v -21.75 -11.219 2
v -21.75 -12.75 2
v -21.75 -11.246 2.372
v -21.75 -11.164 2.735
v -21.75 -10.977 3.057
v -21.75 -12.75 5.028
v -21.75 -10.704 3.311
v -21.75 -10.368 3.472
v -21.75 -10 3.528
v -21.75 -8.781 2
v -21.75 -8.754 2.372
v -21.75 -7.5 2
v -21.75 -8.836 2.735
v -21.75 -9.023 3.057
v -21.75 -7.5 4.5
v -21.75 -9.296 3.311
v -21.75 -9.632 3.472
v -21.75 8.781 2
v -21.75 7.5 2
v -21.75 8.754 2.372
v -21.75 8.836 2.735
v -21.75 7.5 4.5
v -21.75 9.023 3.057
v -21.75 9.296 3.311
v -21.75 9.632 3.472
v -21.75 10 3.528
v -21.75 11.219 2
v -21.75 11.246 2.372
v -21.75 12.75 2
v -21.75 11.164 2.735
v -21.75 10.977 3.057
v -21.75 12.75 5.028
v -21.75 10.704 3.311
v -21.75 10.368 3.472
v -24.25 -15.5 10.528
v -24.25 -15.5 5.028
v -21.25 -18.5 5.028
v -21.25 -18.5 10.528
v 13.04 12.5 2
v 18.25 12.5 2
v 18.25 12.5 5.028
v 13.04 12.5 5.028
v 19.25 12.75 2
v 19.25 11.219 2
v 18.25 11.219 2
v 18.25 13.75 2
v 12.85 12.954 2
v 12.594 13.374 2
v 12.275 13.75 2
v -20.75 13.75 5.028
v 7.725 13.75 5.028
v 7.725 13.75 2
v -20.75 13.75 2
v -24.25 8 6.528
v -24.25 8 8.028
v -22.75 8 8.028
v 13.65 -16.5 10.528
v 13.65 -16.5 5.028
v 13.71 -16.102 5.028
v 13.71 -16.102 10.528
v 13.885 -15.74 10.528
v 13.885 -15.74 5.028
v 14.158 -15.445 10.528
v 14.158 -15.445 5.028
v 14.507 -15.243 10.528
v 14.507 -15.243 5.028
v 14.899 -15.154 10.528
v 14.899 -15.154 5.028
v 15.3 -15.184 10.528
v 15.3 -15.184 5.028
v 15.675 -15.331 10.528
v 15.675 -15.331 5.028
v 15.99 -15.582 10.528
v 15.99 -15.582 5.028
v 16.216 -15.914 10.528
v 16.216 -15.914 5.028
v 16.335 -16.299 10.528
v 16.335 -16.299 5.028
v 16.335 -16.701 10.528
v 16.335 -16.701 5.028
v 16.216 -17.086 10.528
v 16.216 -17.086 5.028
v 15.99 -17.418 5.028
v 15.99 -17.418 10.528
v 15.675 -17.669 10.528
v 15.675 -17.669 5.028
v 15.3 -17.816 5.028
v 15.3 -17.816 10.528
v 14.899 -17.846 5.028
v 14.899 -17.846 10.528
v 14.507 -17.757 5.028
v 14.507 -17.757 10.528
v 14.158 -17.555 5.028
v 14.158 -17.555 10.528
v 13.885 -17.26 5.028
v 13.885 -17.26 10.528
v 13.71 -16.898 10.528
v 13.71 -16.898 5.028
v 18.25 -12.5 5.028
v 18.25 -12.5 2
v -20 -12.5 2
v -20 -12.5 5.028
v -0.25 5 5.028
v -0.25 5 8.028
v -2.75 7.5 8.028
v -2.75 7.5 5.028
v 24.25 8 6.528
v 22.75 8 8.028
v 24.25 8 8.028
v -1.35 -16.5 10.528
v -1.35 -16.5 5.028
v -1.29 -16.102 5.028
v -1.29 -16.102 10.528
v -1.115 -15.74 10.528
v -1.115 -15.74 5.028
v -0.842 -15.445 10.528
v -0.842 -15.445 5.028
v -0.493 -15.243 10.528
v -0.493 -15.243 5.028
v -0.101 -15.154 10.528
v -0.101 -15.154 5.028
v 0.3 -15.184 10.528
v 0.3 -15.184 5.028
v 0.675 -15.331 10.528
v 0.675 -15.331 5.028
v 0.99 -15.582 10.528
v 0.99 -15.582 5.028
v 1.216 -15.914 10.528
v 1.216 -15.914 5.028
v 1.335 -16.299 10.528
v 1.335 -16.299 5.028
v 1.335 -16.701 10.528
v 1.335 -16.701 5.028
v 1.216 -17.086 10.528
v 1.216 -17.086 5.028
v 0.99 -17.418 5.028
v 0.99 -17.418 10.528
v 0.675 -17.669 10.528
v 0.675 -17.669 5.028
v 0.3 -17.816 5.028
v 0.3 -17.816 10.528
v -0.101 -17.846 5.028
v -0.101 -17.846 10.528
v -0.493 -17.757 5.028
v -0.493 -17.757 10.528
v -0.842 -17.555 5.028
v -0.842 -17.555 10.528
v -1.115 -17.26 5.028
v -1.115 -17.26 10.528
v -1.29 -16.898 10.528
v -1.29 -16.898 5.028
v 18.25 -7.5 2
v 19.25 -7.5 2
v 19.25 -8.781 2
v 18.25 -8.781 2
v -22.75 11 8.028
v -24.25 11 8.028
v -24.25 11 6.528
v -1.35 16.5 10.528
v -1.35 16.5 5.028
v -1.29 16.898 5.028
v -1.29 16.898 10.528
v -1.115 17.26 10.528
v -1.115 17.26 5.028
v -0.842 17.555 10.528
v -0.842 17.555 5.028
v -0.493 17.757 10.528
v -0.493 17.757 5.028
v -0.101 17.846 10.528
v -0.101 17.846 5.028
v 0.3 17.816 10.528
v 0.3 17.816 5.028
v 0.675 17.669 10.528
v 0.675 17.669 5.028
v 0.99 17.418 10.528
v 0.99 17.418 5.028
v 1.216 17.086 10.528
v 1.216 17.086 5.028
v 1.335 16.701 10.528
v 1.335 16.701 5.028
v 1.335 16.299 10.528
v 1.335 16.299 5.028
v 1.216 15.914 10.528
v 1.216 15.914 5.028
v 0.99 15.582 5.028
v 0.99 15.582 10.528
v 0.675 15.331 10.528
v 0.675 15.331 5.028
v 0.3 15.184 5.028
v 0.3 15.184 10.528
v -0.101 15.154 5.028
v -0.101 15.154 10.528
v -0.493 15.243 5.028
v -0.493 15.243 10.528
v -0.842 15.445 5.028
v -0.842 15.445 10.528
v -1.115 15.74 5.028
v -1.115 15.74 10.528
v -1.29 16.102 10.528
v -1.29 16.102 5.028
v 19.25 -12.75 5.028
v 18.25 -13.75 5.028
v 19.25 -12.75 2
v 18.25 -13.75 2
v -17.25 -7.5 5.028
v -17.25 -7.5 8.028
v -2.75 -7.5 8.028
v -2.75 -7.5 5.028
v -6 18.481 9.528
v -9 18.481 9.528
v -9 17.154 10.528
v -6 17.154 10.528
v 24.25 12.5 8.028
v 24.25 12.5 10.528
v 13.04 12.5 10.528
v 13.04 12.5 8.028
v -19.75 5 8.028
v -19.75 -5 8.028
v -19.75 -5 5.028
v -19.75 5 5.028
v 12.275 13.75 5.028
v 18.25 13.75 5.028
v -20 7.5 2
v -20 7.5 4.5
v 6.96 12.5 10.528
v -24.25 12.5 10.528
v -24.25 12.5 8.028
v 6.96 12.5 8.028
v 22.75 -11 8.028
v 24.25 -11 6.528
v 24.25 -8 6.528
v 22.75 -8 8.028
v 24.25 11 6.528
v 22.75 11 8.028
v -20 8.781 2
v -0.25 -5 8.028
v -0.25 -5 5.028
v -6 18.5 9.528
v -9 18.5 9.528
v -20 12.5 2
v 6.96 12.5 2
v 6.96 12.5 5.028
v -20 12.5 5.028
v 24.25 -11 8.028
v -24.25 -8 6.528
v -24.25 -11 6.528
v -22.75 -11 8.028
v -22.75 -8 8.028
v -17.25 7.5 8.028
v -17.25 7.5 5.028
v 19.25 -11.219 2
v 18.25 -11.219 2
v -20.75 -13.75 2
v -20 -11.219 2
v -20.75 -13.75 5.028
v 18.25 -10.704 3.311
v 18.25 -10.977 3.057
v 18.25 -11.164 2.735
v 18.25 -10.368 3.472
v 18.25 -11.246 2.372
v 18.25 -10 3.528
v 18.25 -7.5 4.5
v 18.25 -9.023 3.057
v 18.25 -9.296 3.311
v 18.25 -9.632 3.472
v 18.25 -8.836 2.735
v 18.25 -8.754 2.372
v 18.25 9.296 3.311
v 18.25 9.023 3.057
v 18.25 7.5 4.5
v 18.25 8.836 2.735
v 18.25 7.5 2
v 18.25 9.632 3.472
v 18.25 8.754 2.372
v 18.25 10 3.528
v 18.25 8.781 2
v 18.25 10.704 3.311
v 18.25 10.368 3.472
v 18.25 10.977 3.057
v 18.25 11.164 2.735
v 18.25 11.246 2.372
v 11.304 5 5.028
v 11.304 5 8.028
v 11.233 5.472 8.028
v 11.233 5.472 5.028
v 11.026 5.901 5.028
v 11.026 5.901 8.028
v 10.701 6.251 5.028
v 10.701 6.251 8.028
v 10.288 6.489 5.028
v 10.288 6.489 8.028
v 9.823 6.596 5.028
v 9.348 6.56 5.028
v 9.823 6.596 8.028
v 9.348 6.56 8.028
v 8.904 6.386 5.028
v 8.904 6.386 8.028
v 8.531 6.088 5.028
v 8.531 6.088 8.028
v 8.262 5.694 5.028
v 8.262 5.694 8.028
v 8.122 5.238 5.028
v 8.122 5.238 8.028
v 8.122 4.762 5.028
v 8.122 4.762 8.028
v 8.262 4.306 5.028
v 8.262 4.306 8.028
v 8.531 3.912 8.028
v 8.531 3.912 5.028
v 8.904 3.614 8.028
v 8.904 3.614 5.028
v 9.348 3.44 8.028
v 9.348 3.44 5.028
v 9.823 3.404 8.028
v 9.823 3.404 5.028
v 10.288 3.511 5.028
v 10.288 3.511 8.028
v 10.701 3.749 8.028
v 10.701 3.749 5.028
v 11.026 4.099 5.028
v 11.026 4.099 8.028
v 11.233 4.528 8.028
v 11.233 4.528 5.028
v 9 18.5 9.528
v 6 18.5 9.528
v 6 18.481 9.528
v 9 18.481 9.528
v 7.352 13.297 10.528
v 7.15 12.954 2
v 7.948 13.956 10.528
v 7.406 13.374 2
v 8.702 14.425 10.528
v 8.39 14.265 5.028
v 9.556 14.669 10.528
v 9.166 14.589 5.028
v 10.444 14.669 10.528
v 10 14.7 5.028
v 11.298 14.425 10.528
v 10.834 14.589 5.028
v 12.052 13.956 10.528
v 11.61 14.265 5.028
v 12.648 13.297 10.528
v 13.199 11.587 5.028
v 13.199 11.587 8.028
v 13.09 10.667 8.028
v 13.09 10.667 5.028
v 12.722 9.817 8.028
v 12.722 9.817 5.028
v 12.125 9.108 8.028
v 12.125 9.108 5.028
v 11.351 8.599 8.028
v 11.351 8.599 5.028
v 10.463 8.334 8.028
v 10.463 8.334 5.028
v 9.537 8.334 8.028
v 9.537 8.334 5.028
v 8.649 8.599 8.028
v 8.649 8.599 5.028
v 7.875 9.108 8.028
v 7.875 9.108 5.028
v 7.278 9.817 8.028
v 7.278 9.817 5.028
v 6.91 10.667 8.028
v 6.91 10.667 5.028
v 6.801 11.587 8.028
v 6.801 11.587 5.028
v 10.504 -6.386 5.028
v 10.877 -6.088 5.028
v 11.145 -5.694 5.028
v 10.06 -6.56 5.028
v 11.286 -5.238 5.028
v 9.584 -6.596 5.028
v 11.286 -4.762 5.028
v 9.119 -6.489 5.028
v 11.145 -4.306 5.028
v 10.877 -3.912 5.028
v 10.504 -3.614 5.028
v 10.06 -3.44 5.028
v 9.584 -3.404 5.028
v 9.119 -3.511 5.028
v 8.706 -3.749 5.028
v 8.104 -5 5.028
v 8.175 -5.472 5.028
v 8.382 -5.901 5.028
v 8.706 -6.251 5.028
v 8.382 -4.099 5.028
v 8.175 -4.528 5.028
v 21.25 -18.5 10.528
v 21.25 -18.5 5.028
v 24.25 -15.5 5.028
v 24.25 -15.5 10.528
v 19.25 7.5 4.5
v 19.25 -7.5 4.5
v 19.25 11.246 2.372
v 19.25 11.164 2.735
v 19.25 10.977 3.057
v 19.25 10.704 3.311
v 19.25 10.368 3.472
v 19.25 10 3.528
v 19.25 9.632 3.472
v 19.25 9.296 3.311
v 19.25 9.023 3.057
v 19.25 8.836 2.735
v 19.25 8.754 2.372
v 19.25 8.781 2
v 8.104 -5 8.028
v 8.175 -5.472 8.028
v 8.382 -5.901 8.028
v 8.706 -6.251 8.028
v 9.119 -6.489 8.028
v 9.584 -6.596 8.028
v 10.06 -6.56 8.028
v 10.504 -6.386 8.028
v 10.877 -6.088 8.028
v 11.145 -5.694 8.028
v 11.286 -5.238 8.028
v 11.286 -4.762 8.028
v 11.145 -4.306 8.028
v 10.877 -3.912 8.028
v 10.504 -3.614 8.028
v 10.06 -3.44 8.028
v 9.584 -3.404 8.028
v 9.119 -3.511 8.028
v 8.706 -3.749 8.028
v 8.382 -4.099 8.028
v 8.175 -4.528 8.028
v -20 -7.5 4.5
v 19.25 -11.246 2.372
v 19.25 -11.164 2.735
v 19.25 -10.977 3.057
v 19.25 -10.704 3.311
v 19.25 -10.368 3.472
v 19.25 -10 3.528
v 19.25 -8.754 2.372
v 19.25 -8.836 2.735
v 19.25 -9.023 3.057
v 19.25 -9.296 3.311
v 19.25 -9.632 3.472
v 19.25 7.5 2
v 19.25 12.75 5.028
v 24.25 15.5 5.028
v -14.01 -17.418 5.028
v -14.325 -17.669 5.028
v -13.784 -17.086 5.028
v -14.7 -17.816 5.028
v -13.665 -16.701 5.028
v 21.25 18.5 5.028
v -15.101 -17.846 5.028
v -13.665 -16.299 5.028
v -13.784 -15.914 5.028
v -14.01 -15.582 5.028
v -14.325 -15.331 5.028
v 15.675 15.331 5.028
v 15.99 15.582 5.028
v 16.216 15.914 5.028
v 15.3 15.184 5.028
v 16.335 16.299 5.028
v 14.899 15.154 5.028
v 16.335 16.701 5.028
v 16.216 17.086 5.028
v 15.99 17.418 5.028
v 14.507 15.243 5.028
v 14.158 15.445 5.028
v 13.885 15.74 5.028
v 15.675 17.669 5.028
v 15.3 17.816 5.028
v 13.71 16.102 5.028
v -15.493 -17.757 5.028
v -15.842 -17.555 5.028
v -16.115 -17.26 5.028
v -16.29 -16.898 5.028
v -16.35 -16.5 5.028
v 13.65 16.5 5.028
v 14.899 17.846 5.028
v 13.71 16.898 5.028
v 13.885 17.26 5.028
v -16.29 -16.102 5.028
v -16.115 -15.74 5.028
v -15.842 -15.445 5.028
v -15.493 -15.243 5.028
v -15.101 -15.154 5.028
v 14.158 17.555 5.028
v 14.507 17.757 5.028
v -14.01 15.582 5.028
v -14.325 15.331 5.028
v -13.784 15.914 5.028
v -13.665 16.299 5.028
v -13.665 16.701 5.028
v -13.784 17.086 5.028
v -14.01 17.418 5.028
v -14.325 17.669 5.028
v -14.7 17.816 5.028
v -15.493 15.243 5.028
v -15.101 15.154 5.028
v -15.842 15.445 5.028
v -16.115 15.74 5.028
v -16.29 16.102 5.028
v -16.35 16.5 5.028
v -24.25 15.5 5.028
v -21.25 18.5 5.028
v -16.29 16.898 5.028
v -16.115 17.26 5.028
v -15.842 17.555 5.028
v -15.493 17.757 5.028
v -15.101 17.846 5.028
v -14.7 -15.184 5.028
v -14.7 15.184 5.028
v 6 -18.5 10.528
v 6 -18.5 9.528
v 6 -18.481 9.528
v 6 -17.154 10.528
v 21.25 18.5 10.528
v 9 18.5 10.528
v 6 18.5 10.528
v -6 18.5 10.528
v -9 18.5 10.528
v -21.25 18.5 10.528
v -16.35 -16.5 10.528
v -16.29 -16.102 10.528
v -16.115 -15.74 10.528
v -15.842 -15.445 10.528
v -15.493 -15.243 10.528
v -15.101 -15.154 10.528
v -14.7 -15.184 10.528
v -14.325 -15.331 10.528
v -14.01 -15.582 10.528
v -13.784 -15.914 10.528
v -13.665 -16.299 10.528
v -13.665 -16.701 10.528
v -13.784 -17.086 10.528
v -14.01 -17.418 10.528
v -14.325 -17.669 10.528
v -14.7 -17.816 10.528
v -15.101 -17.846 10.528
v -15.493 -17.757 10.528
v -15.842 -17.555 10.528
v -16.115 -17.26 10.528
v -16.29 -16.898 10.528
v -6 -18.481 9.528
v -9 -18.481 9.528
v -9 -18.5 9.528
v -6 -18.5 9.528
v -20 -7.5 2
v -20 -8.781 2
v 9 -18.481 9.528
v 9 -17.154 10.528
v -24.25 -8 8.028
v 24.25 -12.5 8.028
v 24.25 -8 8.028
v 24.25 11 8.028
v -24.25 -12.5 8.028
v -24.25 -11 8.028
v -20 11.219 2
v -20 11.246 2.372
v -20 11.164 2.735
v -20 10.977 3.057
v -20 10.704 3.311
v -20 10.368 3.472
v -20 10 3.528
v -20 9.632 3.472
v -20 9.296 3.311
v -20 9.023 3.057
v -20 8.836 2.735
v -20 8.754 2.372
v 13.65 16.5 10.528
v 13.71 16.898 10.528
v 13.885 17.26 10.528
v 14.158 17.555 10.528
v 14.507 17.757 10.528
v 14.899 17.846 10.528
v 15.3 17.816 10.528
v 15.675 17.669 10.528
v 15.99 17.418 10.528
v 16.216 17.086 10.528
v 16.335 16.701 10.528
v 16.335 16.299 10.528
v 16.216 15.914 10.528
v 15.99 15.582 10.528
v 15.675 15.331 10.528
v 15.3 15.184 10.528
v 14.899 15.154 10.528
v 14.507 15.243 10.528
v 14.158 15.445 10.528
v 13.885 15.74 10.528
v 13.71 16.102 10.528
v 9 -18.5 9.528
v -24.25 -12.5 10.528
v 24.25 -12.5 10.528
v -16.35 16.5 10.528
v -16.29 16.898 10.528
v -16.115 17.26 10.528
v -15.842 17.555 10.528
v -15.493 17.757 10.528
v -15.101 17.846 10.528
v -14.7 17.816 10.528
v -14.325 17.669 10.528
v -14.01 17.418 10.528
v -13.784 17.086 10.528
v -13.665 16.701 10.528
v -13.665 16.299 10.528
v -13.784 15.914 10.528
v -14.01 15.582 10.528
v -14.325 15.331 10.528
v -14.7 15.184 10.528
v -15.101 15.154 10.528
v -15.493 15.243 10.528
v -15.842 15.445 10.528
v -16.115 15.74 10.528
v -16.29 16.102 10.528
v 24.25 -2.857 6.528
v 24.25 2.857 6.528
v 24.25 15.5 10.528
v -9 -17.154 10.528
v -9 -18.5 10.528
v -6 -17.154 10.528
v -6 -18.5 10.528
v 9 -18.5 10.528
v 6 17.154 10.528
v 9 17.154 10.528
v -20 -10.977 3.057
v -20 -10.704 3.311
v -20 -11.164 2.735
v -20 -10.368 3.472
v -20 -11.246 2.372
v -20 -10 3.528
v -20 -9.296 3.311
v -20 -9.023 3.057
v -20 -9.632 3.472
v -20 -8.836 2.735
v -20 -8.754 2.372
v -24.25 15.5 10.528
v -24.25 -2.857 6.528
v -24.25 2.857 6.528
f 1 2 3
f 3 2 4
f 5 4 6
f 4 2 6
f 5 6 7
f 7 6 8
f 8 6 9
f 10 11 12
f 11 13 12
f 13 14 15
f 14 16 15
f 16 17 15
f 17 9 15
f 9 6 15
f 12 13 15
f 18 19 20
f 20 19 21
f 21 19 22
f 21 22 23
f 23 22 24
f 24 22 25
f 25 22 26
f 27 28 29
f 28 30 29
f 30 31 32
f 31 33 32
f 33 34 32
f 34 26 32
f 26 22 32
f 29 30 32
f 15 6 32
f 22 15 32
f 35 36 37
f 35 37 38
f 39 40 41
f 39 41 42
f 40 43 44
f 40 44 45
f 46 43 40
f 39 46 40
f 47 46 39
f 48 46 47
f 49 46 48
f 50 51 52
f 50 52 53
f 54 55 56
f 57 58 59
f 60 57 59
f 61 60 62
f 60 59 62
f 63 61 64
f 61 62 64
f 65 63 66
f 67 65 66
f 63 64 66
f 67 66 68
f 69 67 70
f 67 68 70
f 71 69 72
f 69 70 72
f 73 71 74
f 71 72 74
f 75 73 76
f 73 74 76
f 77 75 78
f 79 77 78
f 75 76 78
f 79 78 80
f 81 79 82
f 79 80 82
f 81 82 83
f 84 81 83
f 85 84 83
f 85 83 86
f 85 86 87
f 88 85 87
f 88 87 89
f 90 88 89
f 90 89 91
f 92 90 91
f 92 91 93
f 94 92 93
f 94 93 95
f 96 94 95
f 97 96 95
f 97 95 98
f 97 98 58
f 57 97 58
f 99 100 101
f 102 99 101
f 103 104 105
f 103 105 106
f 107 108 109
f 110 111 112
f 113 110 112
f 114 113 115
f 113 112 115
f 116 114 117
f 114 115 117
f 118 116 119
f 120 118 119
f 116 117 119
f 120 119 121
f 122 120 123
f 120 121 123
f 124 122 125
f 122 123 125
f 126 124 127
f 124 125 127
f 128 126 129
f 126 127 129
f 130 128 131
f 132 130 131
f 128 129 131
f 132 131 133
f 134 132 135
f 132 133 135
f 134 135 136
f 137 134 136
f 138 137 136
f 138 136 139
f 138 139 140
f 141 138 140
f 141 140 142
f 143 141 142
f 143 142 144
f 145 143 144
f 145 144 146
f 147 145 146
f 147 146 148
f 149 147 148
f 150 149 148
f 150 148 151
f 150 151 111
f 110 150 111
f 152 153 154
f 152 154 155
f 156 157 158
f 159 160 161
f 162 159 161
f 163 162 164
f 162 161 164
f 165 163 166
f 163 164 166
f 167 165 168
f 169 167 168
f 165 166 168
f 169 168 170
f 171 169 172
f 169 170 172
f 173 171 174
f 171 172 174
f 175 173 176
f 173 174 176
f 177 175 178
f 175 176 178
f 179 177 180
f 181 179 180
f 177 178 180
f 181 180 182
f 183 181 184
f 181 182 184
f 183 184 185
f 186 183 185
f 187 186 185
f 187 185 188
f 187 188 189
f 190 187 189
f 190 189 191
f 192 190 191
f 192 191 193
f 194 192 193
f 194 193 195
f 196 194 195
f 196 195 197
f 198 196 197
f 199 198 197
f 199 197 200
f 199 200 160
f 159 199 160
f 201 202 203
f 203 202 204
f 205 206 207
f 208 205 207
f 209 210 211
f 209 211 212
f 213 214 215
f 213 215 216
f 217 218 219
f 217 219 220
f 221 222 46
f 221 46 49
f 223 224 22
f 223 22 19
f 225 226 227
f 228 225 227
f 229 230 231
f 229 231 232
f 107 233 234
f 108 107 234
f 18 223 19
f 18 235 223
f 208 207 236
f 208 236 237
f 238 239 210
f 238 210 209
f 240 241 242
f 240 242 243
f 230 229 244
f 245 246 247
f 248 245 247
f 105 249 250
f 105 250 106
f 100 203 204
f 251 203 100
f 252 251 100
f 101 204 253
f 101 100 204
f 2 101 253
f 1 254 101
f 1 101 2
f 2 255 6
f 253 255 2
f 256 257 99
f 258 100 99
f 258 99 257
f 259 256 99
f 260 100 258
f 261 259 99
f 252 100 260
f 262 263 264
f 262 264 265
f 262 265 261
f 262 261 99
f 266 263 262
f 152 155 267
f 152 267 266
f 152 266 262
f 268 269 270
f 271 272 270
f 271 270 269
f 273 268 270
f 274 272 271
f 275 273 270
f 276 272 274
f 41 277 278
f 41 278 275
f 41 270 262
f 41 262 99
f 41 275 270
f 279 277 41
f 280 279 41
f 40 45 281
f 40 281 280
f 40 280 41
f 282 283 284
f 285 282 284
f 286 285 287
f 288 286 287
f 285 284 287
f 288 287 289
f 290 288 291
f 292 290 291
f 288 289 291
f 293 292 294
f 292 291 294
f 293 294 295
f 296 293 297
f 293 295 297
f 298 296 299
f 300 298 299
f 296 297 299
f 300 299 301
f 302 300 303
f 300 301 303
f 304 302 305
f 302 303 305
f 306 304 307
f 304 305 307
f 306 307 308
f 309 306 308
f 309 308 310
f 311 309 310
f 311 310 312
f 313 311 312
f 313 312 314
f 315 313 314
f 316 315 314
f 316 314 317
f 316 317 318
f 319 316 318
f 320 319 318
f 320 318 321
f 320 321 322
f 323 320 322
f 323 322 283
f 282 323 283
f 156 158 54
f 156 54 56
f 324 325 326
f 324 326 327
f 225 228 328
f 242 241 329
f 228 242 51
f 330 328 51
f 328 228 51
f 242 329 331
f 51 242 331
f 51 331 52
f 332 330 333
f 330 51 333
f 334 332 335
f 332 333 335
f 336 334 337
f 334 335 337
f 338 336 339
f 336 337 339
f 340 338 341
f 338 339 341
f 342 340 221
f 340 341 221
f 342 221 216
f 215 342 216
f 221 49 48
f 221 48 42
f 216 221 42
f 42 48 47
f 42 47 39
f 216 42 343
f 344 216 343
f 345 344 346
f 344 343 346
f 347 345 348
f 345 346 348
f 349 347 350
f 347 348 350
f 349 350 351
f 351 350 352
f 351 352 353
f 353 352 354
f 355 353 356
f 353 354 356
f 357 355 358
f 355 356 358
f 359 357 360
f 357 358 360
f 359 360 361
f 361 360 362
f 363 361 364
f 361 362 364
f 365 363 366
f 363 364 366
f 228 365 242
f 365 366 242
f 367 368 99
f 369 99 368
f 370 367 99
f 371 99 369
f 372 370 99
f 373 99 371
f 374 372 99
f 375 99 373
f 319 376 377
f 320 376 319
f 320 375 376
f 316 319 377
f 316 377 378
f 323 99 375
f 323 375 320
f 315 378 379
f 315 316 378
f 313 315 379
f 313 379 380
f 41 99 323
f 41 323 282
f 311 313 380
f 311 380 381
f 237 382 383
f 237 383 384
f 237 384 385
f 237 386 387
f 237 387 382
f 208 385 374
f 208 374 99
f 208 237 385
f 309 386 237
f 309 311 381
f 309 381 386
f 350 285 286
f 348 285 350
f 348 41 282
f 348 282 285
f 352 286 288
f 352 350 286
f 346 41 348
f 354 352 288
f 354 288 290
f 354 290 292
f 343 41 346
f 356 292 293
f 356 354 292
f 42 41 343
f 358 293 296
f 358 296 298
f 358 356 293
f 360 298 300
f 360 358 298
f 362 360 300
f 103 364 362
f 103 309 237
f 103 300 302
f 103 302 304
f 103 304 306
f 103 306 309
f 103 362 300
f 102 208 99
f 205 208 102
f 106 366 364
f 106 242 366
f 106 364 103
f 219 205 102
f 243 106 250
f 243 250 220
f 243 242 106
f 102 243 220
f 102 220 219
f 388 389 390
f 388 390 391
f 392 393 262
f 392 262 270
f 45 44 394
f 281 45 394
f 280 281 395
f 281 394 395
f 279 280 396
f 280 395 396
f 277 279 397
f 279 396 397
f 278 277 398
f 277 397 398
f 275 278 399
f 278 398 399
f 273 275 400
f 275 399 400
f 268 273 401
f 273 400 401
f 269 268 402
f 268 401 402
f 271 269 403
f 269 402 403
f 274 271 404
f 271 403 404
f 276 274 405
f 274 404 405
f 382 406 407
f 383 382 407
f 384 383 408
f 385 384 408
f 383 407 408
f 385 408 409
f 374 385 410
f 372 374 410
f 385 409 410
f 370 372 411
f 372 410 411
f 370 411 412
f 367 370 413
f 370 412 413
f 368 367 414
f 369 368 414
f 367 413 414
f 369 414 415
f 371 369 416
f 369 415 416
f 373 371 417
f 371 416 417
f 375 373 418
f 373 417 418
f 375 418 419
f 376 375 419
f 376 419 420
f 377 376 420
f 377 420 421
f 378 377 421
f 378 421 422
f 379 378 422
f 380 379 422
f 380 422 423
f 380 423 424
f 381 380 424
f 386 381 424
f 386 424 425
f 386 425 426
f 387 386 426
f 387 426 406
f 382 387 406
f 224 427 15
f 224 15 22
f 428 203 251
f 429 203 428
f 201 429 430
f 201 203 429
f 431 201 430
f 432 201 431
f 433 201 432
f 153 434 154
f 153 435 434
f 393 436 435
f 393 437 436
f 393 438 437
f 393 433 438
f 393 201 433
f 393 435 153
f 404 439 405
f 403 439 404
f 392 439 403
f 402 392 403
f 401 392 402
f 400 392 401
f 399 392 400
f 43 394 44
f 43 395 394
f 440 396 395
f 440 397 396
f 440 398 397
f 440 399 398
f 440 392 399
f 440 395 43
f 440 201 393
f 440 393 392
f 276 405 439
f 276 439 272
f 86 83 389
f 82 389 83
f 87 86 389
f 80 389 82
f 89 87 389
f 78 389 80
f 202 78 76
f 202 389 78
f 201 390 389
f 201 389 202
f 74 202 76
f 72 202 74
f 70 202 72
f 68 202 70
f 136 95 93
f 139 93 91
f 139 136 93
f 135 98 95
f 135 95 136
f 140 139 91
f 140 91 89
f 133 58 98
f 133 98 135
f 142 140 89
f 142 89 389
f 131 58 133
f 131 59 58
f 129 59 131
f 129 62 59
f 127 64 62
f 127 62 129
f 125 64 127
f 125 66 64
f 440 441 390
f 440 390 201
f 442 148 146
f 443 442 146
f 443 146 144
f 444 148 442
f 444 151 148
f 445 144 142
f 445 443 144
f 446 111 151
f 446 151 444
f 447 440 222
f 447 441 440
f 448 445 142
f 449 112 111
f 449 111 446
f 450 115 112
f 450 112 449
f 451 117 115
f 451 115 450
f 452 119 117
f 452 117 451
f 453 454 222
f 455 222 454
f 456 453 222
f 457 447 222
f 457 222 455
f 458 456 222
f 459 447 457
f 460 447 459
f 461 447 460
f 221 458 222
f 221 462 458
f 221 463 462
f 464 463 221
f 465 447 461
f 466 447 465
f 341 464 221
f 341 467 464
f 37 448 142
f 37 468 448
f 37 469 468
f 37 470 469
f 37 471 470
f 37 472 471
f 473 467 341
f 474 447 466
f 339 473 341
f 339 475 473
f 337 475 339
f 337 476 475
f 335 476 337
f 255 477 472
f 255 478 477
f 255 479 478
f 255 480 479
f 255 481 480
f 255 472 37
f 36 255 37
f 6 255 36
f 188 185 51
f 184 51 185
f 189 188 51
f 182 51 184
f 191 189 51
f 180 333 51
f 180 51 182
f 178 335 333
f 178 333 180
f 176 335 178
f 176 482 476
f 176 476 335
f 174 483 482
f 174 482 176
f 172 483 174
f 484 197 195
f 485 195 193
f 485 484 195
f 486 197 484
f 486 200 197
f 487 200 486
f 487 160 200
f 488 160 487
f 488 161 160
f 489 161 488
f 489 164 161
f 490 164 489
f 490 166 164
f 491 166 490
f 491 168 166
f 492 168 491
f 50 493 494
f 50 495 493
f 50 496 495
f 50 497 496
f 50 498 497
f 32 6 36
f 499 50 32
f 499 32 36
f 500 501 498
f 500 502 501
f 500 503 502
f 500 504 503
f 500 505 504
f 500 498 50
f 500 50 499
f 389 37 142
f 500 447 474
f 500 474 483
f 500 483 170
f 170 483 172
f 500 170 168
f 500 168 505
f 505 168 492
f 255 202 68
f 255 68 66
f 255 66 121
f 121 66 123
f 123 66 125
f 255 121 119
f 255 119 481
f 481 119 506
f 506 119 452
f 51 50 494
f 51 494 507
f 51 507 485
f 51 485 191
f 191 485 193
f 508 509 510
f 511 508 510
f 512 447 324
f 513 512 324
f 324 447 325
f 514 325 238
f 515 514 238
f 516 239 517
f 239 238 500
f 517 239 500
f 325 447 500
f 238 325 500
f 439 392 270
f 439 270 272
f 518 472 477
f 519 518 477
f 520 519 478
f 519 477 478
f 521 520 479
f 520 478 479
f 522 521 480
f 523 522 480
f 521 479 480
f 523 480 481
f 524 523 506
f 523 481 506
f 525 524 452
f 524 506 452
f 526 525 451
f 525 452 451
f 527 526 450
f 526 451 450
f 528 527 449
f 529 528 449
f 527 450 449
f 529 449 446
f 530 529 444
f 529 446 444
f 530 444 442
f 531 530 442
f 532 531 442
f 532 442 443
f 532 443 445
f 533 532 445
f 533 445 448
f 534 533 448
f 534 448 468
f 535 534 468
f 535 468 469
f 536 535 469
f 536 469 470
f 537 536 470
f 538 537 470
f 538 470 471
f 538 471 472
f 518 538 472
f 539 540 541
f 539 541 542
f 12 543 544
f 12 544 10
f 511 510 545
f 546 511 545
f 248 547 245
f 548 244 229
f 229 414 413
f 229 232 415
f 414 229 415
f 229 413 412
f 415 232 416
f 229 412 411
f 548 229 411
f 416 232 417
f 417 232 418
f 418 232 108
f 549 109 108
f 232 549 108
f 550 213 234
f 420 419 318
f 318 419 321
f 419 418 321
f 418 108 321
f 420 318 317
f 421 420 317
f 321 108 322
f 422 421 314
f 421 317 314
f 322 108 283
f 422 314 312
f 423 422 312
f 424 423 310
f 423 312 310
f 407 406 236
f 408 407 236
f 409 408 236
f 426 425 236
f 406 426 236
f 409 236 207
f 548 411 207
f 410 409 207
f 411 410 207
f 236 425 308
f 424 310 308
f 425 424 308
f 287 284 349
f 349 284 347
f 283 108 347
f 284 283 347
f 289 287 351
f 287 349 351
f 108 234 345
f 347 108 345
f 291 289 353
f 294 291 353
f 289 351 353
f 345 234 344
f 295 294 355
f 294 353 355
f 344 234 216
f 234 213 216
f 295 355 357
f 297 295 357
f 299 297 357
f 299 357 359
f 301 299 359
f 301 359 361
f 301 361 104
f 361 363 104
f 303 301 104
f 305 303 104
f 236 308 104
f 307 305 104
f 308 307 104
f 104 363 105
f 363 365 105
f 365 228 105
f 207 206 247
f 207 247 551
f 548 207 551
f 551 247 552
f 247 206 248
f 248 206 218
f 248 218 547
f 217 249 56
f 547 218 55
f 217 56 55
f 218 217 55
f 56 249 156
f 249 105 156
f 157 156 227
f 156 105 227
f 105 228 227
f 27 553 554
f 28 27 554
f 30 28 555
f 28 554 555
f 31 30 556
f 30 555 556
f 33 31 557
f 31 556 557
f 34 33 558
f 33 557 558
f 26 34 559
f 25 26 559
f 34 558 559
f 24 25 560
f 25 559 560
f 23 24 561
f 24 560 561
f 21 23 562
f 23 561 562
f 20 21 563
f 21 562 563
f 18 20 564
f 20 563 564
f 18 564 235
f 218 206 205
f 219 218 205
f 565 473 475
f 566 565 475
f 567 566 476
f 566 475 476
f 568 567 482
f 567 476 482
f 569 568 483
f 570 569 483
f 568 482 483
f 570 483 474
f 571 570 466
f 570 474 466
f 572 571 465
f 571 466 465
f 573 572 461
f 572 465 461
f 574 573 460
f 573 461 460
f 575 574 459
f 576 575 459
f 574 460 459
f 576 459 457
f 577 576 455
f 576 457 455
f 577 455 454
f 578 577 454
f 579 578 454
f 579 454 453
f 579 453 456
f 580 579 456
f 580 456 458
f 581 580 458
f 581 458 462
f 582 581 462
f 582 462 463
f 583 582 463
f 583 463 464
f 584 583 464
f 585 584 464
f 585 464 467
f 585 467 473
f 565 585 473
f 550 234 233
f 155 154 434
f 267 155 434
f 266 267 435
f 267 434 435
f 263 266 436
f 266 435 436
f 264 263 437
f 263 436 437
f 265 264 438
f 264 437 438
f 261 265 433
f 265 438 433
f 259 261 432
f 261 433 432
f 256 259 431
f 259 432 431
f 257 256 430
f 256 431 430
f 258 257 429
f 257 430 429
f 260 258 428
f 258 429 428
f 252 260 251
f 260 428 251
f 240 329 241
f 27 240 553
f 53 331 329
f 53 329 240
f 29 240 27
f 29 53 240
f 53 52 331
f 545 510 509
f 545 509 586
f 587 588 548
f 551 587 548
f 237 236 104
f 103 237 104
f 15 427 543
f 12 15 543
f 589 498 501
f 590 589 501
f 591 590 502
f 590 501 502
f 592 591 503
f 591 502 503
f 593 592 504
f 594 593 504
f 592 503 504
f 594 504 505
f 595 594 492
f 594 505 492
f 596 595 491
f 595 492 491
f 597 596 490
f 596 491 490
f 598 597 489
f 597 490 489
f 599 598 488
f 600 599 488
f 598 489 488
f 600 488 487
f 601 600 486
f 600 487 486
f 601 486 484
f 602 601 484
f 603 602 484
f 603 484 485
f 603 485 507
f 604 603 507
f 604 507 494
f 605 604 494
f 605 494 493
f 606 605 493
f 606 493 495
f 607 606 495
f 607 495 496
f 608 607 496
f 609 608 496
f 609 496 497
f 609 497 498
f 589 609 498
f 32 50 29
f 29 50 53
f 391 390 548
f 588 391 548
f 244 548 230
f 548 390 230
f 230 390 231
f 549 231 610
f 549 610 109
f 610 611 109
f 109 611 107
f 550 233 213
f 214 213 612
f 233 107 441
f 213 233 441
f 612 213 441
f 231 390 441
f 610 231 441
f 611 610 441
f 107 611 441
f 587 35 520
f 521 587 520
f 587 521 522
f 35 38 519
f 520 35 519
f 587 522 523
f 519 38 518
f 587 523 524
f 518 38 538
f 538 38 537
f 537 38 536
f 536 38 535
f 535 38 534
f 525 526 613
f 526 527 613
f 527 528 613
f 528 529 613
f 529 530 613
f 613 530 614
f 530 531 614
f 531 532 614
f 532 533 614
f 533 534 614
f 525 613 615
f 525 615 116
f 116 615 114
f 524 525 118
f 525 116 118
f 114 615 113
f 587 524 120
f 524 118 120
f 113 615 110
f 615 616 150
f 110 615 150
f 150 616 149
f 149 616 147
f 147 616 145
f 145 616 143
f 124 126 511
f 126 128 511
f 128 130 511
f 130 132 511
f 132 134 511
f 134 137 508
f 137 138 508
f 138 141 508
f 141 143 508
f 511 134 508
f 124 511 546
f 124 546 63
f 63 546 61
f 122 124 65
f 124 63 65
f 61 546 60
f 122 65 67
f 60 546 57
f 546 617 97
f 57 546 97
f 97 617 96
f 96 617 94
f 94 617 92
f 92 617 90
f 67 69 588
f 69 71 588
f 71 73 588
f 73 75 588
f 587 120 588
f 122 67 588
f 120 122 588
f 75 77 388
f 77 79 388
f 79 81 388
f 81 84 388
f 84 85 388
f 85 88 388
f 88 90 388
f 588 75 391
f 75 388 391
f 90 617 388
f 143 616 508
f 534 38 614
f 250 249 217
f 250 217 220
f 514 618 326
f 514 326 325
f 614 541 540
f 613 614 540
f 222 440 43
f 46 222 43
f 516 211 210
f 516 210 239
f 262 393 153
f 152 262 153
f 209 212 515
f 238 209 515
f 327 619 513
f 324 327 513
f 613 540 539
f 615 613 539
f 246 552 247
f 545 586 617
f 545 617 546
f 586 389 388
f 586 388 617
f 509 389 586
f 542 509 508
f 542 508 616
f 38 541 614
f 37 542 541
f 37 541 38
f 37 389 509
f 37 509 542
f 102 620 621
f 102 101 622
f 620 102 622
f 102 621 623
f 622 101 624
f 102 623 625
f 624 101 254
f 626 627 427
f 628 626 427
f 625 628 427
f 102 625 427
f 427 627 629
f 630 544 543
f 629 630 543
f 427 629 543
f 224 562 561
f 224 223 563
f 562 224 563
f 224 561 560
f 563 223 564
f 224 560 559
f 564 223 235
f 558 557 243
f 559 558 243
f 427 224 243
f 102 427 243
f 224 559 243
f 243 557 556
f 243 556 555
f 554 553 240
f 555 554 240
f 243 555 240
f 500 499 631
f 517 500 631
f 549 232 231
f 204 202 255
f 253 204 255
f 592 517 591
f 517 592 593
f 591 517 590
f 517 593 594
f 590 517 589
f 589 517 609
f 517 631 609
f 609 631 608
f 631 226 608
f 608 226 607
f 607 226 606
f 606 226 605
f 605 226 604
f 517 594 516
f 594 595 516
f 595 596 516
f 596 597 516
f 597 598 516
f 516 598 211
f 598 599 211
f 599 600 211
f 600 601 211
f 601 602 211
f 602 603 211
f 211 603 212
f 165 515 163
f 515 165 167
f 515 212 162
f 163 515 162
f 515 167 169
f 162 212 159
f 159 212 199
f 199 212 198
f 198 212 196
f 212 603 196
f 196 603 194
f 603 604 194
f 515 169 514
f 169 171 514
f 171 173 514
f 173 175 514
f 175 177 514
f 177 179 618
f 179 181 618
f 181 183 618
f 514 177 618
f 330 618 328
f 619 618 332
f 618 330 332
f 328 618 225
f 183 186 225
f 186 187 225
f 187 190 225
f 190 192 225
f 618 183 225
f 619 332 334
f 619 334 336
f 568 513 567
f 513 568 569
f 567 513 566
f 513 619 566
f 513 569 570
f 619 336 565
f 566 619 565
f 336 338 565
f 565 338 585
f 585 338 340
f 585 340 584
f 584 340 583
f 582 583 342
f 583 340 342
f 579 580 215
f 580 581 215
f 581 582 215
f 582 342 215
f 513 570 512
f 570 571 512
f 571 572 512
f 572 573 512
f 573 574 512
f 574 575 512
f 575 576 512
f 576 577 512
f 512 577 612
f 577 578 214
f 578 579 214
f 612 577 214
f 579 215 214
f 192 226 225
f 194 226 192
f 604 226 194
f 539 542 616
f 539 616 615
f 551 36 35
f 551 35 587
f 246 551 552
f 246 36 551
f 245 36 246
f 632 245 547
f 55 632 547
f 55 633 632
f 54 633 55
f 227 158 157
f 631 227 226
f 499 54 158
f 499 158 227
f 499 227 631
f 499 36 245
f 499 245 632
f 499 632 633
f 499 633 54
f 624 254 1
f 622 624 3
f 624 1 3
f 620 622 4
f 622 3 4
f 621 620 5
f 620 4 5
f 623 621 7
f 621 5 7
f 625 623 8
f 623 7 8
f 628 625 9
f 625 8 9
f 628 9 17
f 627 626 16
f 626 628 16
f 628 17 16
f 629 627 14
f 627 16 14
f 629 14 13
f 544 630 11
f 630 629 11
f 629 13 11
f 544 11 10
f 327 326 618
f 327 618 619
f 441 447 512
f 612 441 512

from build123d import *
from OCP.BRepFilletAPI import BRepFilletAPI_MakeChamfer

# Parameters (mm, degrees)
SKETCH_1_W                  = 48.5
SKETCH_1_H                  = 37
EXTRUDE_1_DEPTH             = 7.5
SKETCH_2_W                  = 4.5
SKETCH_2_H                  = 25
CUT_EXTRUDE_1_DEPTH         = 54.398977368
SKETCH_3_W                  = 41
SKETCH_3_H                  = 27.5
EXTRUDE_2_DEPTH             = 3.028
SKETCH_4_W                  = 38.25
SKETCH_4_H                  = 25
CUT_EXTRUDE_2_DEPTH         = 3.028
CUT_EXTRUDE_3_DEPTH         = 49.015109955
CUT_EXTRUDE_4_DEPTH         = 52.139033859
CUT_EXTRUDE_5_DEPTH         = 32.090983966
HOLE_WIZARD_2_5_2_5_1_D     = 2.5
HOLE_WIZARD_2_5_2_5_1_DEPTH = 1.75
HOLE_WIZARD_2_5_2_5_2_D     = 2.5
HOLE_WIZARD_2_5_2_5_2_DEPTH = 6
HOLE_WIZARD_2_5_2_5_3_D     = 2.5
HOLE_WIZARD_2_5_2_5_3_DEPTH = 4.25
HOLE_WIZARD_2_7_2_7_1_D     = 2.7
CHAMFER_1_SIZE              = 3
SKETCH_17_W                 = 3
SKETCH_17_H                 = 4
CUT_EXTRUDE_8_DEPTH         = 3
CHAMFER_2_SIZE              = 3
CHAMFER_2_SIZE_2            = 3.981134465
SKETCH_19_W                 = 2
SKETCH_19_H                 = 3
CUT_EXTRUDE_9_DEPTH         = 1.5
CHAMFER_3_SIZE              = 2
CHAMFER_4_SIZE              = 1
SKETCH_20_R                 = 3.2
CUT_EXTRUDE_10_DEPTH        = 21.5
SKETCH_21_W                 = 19.5
SKETCH_21_H                 = 15
CUT_EXTRUDE_11_DEPTH        = 21.5
CHAMFER_5_SIZE              = 2.5
SKETCH_22_W                 = 9
SKETCH_22_H                 = 15
CUT_EXTRUDE_12_DEPTH        = 51.5
SKETCH_23_W                 = 48.5
SKETCH_23_H                 = 2
CUT_EXTRUDE_13_DEPTH        = 50
SKETCH_24_R                 = 1.6
CUT_EXTRUDE_14_DEPTH        = 10


# Some blends are built 0.0001 mm under size
with BuildPart() as part:
    # 草图1 → 凸台-拉伸1 (new body)
    with BuildSketch(Plane(origin=(0, 0, 5.028), x_dir=(-1, 0, 0), z_dir=(0, 0, -1))):
        Rectangle(SKETCH_1_W, SKETCH_1_H)
    extrude(amount=-EXTRUDE_1_DEPTH)

    # 草图2 → 切除-拉伸1 (cut, through all)
    with BuildSketch(Plane(origin=(24.25, 0, 0), x_dir=(0, 0, -1), z_dir=(1, 0, 0))):
        with Locations((-10.278, 0)):
            Rectangle(SKETCH_2_W, SKETCH_2_H)
    extrude(amount=-CUT_EXTRUDE_1_DEPTH, mode=Mode.SUBTRACT)

    # 草图3 → 凸台-拉伸2 (add)
    with BuildSketch(Plane(origin=(0, 0, 5.028), x_dir=(-1, 0, 0), z_dir=(0, 0, -1))):
        with Locations((1.25, 0)):
            Rectangle(SKETCH_3_W, SKETCH_3_H)
    extrude(amount=EXTRUDE_2_DEPTH)

    # 草图4 → 切除-拉伸2 (cut)
    with BuildSketch(Plane(origin=(0, 0, 2), x_dir=(-1, 0, 0), z_dir=(0, 0, -1))):
        with Locations((0.875, 0)):
            Rectangle(SKETCH_4_W, SKETCH_4_H)
    extrude(amount=-CUT_EXTRUDE_2_DEPTH, mode=Mode.SUBTRACT)

    # 草图5 → 切除-拉伸3 (cut, through all)
    with BuildSketch(Plane.ZY.offset(-18.25)):
        with BuildLine():
            Line((2, 7.034395212), (2, -7.034395212))
            ThreePointArc((2, -7.034395212), (4.278, 0), (2, 7.034395212))
        make_face()
    extrude(amount=-CUT_EXTRUDE_3_DEPTH, mode=Mode.SUBTRACT)

    # 草图6 → 切除-拉伸4 (cut, through all)
    with BuildSketch(Plane.ZY.offset(21.75)):
        with BuildLine():
            Line((2, 7.034395212), (2, -7.034395212))
            ThreePointArc((2, -7.034395212), (4.278, 0), (2, 7.034395212))
        make_face()
    extrude(amount=-CUT_EXTRUDE_4_DEPTH, mode=Mode.SUBTRACT)

    # 草图7 → 切除-拉伸5 (cut, through all)
    with BuildSketch(Plane.XY.offset(8.028)):
        with BuildLine():
            Line((-7.978419869, 7.029222073), (-13.021580131, 7.029222073))
            ThreePointArc((-13.021580131, 7.029222073), (-17.801221513, 4.934335949), (-19.5, 0))
            ThreePointArc((-19.5, 0), (-17.801221513, -4.934335949), (-13.021580131, -7.029222073))
            Line((-13.021580131, -7.029222073), (-7.978419869, -7.029222073))
            ThreePointArc((-7.978419869, -7.029222073), (-3.198778487, -4.934335949), (-1.5, 0))
            ThreePointArc((-1.5, 0), (-3.198778487, 4.934335949), (-7.978419869, 7.029222073))
        make_face()
    extrude(amount=-CUT_EXTRUDE_5_DEPTH, mode=Mode.SUBTRACT)

    # Ø2.5 (2.5) 直径孔1
    with Locations(Plane.ZY.offset(21.75)):
        with Locations((2.278, 10)):
            Hole(HOLE_WIZARD_2_5_2_5_1_D / 2, depth=HOLE_WIZARD_2_5_2_5_1_DEPTH)

    # Ø2.5 (2.5) 直径孔2
    with Locations(Plane.ZY.offset(-18.25)):
        with Locations((2.278, -10), (2.278, 10)):
            Hole(HOLE_WIZARD_2_5_2_5_2_D / 2, depth=HOLE_WIZARD_2_5_2_5_2_DEPTH)

    # Ø2.5 (2.5) 直径孔3
    with Locations(Plane(origin=(-20, 0, 0), x_dir=(0, 0, -1), z_dir=(1, 0, 0))):
        with Locations((-2.278, -10)):
            Hole(HOLE_WIZARD_2_5_2_5_3_D / 2, depth=HOLE_WIZARD_2_5_2_5_3_DEPTH)

    # Ø2.7 (2.7) 直径孔1 (through all)
    with Locations(Plane.XY.offset(12.528)):
        with Locations((0, -16.5), (-15, -16.5), (15, -16.5), (0, 16.5), (-15, 16.5), (15, 16.5)):
            Hole(HOLE_WIZARD_2_7_2_7_1_D / 2)

    # 倒角1
    chamfer_1_edges = [part.edges().sort_by_distance(p)[0] for p in [
        (-24.25, 18.5, 8.778),
        (-24.25, -18.5, 8.778),
        (24.25, -18.5, 8.778),
        (24.25, 18.5, 8.778),
    ]]
    chamfer(chamfer_1_edges, length=CHAMFER_1_SIZE)

    # 草图17 → 切除-拉伸8 (cut)
    with BuildSketch(Plane.XY.offset(12.528)):
        with Locations((-7.5, -16.5)):
            Rectangle(SKETCH_17_W, SKETCH_17_H)
        with Locations((7.5, -16.5)):
            Rectangle(SKETCH_17_W, SKETCH_17_H)
        with Locations((7.5, 16.5)):
            Rectangle(SKETCH_17_W, SKETCH_17_H)
        with Locations((-7.5, 16.5)):
            Rectangle(SKETCH_17_W, SKETCH_17_H)
    extrude(amount=-CUT_EXTRUDE_8_DEPTH, mode=Mode.SUBTRACT)

    # 倒角2
    chamfer_2_edges_1 = [part.edges().sort_by_distance(p)[0] for p in [
        (7.5, -14.5, 9.528),
    ]]
    chamfer_2_side_1 = [part.faces().sort_by_distance(p)[0] for p in [
        (7.5, -14.5, 9.588),
    ]]
    chamfer_2_edges_2 = [part.edges().sort_by_distance(p)[0] for p in [
        (-7.5, -14.5, 9.528),
    ]]
    chamfer_2_side_2 = [part.faces().sort_by_distance(p)[0] for p in [
        (-7.5, -14.5, 9.588),
    ]]
    chamfer_2_edges_3 = [part.edges().sort_by_distance(p)[0] for p in [
        (-7.5, 14.5, 9.528),
    ]]
    chamfer_2_side_3 = [part.faces().sort_by_distance(p)[0] for p in [
        (-7.5, 14.5, 9.588),
    ]]
    chamfer_2_edges_4 = [part.edges().sort_by_distance(p)[0] for p in [
        (7.5, 14.5, 9.528),
    ]]
    chamfer_2_side_4 = [part.faces().sort_by_distance(p)[0] for p in [
        (7.5, 14.5, 9.588),
    ]]
    chamfer_2 = BRepFilletAPI_MakeChamfer(part.part.solid().wrapped)
    for e in chamfer_2_edges_1:
        chamfer_2.Add(CHAMFER_2_SIZE - 0.0001, CHAMFER_2_SIZE_2 - 0.0001, e.wrapped, chamfer_2_side_1[0].wrapped)
    for e in chamfer_2_edges_2:
        chamfer_2.Add(CHAMFER_2_SIZE - 0.0001, CHAMFER_2_SIZE_2 - 0.0001, e.wrapped, chamfer_2_side_2[0].wrapped)
    for e in chamfer_2_edges_3:
        chamfer_2.Add(CHAMFER_2_SIZE - 0.0001, CHAMFER_2_SIZE_2 - 0.0001, e.wrapped, chamfer_2_side_3[0].wrapped)
    for e in chamfer_2_edges_4:
        chamfer_2.Add(CHAMFER_2_SIZE - 0.0001, CHAMFER_2_SIZE_2 - 0.0001, e.wrapped, chamfer_2_side_4[0].wrapped)
    add(Compound.cast(chamfer_2.Shape()), mode=Mode.REPLACE)  # a hair under: the kernel refuses the full size

    # 草图19 → 切除-拉伸9 (cut)
    with BuildSketch(Plane.XY.offset(8.028)):
        with Locations((-23.25, -9.5)):
            Rectangle(SKETCH_19_W, SKETCH_19_H)
        with Locations((-23.25, 9.5)):
            Rectangle(SKETCH_19_W, SKETCH_19_H)
        with Locations((23.25, 9.5)):
            Rectangle(SKETCH_19_W, SKETCH_19_H)
        with Locations((23.25, -9.5)):
            Rectangle(SKETCH_19_W, SKETCH_19_H)
    extrude(amount=-CUT_EXTRUDE_9_DEPTH, mode=Mode.SUBTRACT)

    # 倒角3
    # the kernel refuses this chamfer: 2 mm, written as the material it adds along each edge
    with BuildSketch(Plane(origin=(22.25, 11, 6.528), x_dir=(0.9996219169112968, 0, -0.02749587661058651), z_dir=(0, -1, 0))) as chamfer_3_piece_1_section:
        Polygon((CHAMFER_3_SIZE * 0.999621916911, CHAMFER_3_SIZE * 0.0274958766106), (-CHAMFER_3_SIZE * 0.0274958766106, CHAMFER_3_SIZE * 0.999621916911), (0, 0), align=None)
    chamfer_3_piece_1 = extrude(amount=8.143365976, mode=Mode.PRIVATE)
    chamfer_3_piece_1 = split(chamfer_3_piece_1, bisect_by=Plane(origin=(22.95, 9.5, 8.028), z_dir=(0, 0, -1)), keep=Keep.TOP, mode=Mode.PRIVATE)
    add(chamfer_3_piece_1)
    with BuildSketch(Plane(origin=(22.25, -11, 6.528), x_dir=(0.9996219169112968, 0, -0.02749587661058651), z_dir=(0, 1, 0))) as chamfer_3_piece_2_section:
        Polygon((CHAMFER_3_SIZE * 0.999621916911, -CHAMFER_3_SIZE * 0.0274958766106), (-CHAMFER_3_SIZE * 0.0274958766106, -CHAMFER_3_SIZE * 0.999621916911), (0, 0), align=None)
    chamfer_3_piece_2 = extrude(amount=8.143365976, mode=Mode.PRIVATE)
    chamfer_3_piece_2 = split(chamfer_3_piece_2, bisect_by=Plane(origin=(22.95, -9.5, 8.028), z_dir=(0, 0, -1)), keep=Keep.TOP, mode=Mode.PRIVATE)
    add(chamfer_3_piece_2)
    with BuildSketch(Plane(origin=(-22.25, 11, 6.528), x_dir=(-0.9996219169112968, 0, -0.02749587661058651), z_dir=(0, -1, 0))) as chamfer_3_piece_3_section:
        Polygon((CHAMFER_3_SIZE * 0.999621916911, -CHAMFER_3_SIZE * 0.0274958766106), (-CHAMFER_3_SIZE * 0.0274958766106, -CHAMFER_3_SIZE * 0.999621916911), (0, 0), align=None)
    chamfer_3_piece_3 = extrude(amount=8.143365976, mode=Mode.PRIVATE)
    chamfer_3_piece_3 = split(chamfer_3_piece_3, bisect_by=Plane(origin=(-22.95, 9.5, 8.028), z_dir=(0, 0, -1)), keep=Keep.TOP, mode=Mode.PRIVATE)
    add(chamfer_3_piece_3)
    with BuildSketch(Plane(origin=(-22.25, -16.143365976, 6.528), x_dir=(-0.9996219169112968, 0, -0.02749587661058651), z_dir=(0, 1, 0))) as chamfer_3_piece_4_section:
        Polygon((CHAMFER_3_SIZE * 0.999621916911, CHAMFER_3_SIZE * 0.0274958766106), (-CHAMFER_3_SIZE * 0.0274958766106, CHAMFER_3_SIZE * 0.999621916911), (0, 0), align=None)
    chamfer_3_piece_4 = extrude(amount=13.286731952, mode=Mode.PRIVATE)
    chamfer_3_piece_4 = split(chamfer_3_piece_4, bisect_by=Plane(origin=(-22.95, -9.5, 8.028), z_dir=(0, 0, -1)), keep=Keep.TOP, mode=Mode.PRIVATE)
    chamfer_3_piece_4 = split(chamfer_3_piece_4, bisect_by=Plane(origin=(-26.6, -13.15, 7.128), z_dir=(0.7071067811865476, 0.7071067811865476, 0)), keep=Keep.TOP, mode=Mode.PRIVATE)
    add(chamfer_3_piece_4)

    # 倒角4
    chamfer_4_edges = [part.edges().sort_by_distance(p)[0] for p in [
        (-21.75, 13.75, 3.514),
        (19.25, 13.75, 3.514),
        (19.25, -13.75, 3.514),
        (-21.75, -13.75, 3.514),
    ]]
    chamfer(chamfer_4_edges, length=CHAMFER_4_SIZE)

    # 草图20 → 切除-拉伸10 (cut)
    with BuildSketch(Plane(origin=(0, 0, 2), x_dir=(-1, 0, 0), z_dir=(0, 0, -1))):
        with Locations(Location((-10, 11.5, 0), (0, 0, 18.209956864))):
            Circle(SKETCH_20_R)
    extrude(amount=-CUT_EXTRUDE_10_DEPTH, mode=Mode.SUBTRACT)

    # 草图21 → 切除-拉伸11 (cut)
    with BuildSketch(Plane.XY.offset(8.028)):
        with Locations((-10, 0)):
            Rectangle(SKETCH_21_W, SKETCH_21_H)
    extrude(amount=-CUT_EXTRUDE_11_DEPTH, mode=Mode.SUBTRACT)

    # 倒角5
    chamfer_5_edges = [part.edges().sort_by_distance(p)[0] for p in [
        (-0.25, 7.5, 6.528),
        (-0.25, -7.5, 6.528),
        (-19.75, -7.5, 6.528),
        (-19.75, 7.5, 6.528),
    ]]
    chamfer(chamfer_5_edges, length=CHAMFER_5_SIZE)

    # 草图22 → 切除-拉伸12 (cut)
    with BuildSketch(Plane(origin=(19.25, 0, 0), x_dir=(0, 0, -1), z_dir=(1, 0, 0))):
        Rectangle(SKETCH_22_W, SKETCH_22_H)
    extrude(amount=-CUT_EXTRUDE_12_DEPTH, mode=Mode.SUBTRACT)

    # 草图23 → 切除-拉伸13 (cut)
    with BuildSketch(Plane.XZ.offset(18.5)):
        with Locations((0, 11.528)):
            Rectangle(SKETCH_23_W, SKETCH_23_H)
    extrude(amount=-CUT_EXTRUDE_13_DEPTH, mode=Mode.SUBTRACT)

    # 草图24 → 切除-拉伸14 (cut)
    with BuildSketch(Plane.XY.offset(8.028)):
        with Locations((9.703840341, 5)):
            Circle(SKETCH_24_R)
        with Locations(Location((9.703840341, -5, 0), (0, 0, 180))):
            Circle(SKETCH_24_R)
    extrude(amount=-CUT_EXTRUDE_14_DEPTH, mode=Mode.SUBTRACT)


solid = part.part
